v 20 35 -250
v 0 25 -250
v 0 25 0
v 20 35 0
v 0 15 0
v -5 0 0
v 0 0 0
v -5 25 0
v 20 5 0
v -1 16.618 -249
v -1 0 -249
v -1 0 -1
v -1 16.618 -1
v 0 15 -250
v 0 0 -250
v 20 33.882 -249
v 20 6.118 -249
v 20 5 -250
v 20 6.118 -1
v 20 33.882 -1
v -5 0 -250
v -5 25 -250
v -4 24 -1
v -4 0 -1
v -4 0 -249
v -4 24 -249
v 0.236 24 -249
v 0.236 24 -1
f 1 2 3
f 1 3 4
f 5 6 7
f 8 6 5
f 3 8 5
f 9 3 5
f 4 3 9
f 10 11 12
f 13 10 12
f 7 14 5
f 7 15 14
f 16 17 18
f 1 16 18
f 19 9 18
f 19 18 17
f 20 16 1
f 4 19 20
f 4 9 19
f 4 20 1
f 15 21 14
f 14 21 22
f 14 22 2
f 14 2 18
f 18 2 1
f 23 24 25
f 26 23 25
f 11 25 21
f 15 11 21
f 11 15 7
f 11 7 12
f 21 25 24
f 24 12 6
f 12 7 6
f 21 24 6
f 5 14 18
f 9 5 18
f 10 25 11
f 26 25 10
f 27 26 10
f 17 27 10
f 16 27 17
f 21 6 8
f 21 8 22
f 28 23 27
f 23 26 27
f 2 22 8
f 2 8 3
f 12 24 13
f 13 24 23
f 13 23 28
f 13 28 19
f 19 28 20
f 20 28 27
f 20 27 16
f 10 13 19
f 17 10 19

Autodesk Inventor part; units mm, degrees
ref_plane "YZ Plane" through (0, 0, 0) normal (1, 0, 0) x (0, 1, 0)
ref_plane "XZ Plane" through (0, 0, 0) normal (0, 1, 0) x (-1, 0, 0)
ref_plane "XY Plane" through (0, 0, 0) normal (0, 0, 1) x (1, 0, 0)
sketch "草圖1" plane through (0, 0, 0) normal (0, 1, 0) x (-1, 0, 0)
  line L0 (0, 0) -> (5, 0)
  line L1 (5, 0) -> (5, -250)
  line L2 (5, -250) -> (0, -250)
  line L3 (0, -250) -> (0, 0)
  dimension "d0" = 5
  dimension "d1" = 250
extrude "擠出1" add sketch "草圖1" along normal blind 15
sketch "草圖3" plane through (0, 15, 0) normal (0, 1, 0) x (1, 0, 0)
  line L0 (0, 250) -> (-5, 250) projected
  line L1 (0, 0) -> (-5, 0)
  line L2 (-5, 0) -> (-5, 250)
  line L3 (-5, 250) -> (0, 250)
  line L4 (0, 250) -> (0, 0)
extrude "擠出3" add sketch "草圖3" along normal blind 10
sketch "草圖4" plane through (-5, 0, 0) normal (0, 0, 1) x (1, 0, 0)
  line L0 (5, 0) -> (5, 25) projected
  line L1 (0, 25) -> (5, 25) projected
  line L2 (5, 25) -> (0, 25) projected
  line L3 (5, 25) -> (25, 35)
  line L4 (5, 15) -> (25, 5)
  line L5 (25, 5) -> (25, 35)
  line L6 (0, 0) -> (5, 0) projected
  line L7 (0, 0) -> (0, 25) projected
  line L8 (-5, 0) -> (30, 0) projected
  dimension "d8" = 10
  dimension "d9" = 30
  dimension "d19" = 20
extrude "擠出4" add sketch "草圖4" against normal up to surface (250 mm away) contours L0 L3 L5 L4
shell "薄殼2" thickness 1 removed faces 2 at (20, 15, -83.3333) at (-1.6667, 0, -83.3333)
equation "\"d0\" = bottom_w"
equation "\"d1\" = bottom_l"
equation "\"d2\" = bottom_h"
equation "\"d6\" = nuzzle_lh"
equation "\"d8\" = nuzzle_lh"
equation "\"d9\" = 3 * nuzzle_lh"
equation "\"d15\" = nuzzle_lh"
equation "\"bottom_w\" = 5"
equation "\"bottom_l\" = 250"
equation "\"bottom_h\" = 15"
equation "\"nuzzle_lh\" = 10"
properties part number "nuzzle_v1_0310"
